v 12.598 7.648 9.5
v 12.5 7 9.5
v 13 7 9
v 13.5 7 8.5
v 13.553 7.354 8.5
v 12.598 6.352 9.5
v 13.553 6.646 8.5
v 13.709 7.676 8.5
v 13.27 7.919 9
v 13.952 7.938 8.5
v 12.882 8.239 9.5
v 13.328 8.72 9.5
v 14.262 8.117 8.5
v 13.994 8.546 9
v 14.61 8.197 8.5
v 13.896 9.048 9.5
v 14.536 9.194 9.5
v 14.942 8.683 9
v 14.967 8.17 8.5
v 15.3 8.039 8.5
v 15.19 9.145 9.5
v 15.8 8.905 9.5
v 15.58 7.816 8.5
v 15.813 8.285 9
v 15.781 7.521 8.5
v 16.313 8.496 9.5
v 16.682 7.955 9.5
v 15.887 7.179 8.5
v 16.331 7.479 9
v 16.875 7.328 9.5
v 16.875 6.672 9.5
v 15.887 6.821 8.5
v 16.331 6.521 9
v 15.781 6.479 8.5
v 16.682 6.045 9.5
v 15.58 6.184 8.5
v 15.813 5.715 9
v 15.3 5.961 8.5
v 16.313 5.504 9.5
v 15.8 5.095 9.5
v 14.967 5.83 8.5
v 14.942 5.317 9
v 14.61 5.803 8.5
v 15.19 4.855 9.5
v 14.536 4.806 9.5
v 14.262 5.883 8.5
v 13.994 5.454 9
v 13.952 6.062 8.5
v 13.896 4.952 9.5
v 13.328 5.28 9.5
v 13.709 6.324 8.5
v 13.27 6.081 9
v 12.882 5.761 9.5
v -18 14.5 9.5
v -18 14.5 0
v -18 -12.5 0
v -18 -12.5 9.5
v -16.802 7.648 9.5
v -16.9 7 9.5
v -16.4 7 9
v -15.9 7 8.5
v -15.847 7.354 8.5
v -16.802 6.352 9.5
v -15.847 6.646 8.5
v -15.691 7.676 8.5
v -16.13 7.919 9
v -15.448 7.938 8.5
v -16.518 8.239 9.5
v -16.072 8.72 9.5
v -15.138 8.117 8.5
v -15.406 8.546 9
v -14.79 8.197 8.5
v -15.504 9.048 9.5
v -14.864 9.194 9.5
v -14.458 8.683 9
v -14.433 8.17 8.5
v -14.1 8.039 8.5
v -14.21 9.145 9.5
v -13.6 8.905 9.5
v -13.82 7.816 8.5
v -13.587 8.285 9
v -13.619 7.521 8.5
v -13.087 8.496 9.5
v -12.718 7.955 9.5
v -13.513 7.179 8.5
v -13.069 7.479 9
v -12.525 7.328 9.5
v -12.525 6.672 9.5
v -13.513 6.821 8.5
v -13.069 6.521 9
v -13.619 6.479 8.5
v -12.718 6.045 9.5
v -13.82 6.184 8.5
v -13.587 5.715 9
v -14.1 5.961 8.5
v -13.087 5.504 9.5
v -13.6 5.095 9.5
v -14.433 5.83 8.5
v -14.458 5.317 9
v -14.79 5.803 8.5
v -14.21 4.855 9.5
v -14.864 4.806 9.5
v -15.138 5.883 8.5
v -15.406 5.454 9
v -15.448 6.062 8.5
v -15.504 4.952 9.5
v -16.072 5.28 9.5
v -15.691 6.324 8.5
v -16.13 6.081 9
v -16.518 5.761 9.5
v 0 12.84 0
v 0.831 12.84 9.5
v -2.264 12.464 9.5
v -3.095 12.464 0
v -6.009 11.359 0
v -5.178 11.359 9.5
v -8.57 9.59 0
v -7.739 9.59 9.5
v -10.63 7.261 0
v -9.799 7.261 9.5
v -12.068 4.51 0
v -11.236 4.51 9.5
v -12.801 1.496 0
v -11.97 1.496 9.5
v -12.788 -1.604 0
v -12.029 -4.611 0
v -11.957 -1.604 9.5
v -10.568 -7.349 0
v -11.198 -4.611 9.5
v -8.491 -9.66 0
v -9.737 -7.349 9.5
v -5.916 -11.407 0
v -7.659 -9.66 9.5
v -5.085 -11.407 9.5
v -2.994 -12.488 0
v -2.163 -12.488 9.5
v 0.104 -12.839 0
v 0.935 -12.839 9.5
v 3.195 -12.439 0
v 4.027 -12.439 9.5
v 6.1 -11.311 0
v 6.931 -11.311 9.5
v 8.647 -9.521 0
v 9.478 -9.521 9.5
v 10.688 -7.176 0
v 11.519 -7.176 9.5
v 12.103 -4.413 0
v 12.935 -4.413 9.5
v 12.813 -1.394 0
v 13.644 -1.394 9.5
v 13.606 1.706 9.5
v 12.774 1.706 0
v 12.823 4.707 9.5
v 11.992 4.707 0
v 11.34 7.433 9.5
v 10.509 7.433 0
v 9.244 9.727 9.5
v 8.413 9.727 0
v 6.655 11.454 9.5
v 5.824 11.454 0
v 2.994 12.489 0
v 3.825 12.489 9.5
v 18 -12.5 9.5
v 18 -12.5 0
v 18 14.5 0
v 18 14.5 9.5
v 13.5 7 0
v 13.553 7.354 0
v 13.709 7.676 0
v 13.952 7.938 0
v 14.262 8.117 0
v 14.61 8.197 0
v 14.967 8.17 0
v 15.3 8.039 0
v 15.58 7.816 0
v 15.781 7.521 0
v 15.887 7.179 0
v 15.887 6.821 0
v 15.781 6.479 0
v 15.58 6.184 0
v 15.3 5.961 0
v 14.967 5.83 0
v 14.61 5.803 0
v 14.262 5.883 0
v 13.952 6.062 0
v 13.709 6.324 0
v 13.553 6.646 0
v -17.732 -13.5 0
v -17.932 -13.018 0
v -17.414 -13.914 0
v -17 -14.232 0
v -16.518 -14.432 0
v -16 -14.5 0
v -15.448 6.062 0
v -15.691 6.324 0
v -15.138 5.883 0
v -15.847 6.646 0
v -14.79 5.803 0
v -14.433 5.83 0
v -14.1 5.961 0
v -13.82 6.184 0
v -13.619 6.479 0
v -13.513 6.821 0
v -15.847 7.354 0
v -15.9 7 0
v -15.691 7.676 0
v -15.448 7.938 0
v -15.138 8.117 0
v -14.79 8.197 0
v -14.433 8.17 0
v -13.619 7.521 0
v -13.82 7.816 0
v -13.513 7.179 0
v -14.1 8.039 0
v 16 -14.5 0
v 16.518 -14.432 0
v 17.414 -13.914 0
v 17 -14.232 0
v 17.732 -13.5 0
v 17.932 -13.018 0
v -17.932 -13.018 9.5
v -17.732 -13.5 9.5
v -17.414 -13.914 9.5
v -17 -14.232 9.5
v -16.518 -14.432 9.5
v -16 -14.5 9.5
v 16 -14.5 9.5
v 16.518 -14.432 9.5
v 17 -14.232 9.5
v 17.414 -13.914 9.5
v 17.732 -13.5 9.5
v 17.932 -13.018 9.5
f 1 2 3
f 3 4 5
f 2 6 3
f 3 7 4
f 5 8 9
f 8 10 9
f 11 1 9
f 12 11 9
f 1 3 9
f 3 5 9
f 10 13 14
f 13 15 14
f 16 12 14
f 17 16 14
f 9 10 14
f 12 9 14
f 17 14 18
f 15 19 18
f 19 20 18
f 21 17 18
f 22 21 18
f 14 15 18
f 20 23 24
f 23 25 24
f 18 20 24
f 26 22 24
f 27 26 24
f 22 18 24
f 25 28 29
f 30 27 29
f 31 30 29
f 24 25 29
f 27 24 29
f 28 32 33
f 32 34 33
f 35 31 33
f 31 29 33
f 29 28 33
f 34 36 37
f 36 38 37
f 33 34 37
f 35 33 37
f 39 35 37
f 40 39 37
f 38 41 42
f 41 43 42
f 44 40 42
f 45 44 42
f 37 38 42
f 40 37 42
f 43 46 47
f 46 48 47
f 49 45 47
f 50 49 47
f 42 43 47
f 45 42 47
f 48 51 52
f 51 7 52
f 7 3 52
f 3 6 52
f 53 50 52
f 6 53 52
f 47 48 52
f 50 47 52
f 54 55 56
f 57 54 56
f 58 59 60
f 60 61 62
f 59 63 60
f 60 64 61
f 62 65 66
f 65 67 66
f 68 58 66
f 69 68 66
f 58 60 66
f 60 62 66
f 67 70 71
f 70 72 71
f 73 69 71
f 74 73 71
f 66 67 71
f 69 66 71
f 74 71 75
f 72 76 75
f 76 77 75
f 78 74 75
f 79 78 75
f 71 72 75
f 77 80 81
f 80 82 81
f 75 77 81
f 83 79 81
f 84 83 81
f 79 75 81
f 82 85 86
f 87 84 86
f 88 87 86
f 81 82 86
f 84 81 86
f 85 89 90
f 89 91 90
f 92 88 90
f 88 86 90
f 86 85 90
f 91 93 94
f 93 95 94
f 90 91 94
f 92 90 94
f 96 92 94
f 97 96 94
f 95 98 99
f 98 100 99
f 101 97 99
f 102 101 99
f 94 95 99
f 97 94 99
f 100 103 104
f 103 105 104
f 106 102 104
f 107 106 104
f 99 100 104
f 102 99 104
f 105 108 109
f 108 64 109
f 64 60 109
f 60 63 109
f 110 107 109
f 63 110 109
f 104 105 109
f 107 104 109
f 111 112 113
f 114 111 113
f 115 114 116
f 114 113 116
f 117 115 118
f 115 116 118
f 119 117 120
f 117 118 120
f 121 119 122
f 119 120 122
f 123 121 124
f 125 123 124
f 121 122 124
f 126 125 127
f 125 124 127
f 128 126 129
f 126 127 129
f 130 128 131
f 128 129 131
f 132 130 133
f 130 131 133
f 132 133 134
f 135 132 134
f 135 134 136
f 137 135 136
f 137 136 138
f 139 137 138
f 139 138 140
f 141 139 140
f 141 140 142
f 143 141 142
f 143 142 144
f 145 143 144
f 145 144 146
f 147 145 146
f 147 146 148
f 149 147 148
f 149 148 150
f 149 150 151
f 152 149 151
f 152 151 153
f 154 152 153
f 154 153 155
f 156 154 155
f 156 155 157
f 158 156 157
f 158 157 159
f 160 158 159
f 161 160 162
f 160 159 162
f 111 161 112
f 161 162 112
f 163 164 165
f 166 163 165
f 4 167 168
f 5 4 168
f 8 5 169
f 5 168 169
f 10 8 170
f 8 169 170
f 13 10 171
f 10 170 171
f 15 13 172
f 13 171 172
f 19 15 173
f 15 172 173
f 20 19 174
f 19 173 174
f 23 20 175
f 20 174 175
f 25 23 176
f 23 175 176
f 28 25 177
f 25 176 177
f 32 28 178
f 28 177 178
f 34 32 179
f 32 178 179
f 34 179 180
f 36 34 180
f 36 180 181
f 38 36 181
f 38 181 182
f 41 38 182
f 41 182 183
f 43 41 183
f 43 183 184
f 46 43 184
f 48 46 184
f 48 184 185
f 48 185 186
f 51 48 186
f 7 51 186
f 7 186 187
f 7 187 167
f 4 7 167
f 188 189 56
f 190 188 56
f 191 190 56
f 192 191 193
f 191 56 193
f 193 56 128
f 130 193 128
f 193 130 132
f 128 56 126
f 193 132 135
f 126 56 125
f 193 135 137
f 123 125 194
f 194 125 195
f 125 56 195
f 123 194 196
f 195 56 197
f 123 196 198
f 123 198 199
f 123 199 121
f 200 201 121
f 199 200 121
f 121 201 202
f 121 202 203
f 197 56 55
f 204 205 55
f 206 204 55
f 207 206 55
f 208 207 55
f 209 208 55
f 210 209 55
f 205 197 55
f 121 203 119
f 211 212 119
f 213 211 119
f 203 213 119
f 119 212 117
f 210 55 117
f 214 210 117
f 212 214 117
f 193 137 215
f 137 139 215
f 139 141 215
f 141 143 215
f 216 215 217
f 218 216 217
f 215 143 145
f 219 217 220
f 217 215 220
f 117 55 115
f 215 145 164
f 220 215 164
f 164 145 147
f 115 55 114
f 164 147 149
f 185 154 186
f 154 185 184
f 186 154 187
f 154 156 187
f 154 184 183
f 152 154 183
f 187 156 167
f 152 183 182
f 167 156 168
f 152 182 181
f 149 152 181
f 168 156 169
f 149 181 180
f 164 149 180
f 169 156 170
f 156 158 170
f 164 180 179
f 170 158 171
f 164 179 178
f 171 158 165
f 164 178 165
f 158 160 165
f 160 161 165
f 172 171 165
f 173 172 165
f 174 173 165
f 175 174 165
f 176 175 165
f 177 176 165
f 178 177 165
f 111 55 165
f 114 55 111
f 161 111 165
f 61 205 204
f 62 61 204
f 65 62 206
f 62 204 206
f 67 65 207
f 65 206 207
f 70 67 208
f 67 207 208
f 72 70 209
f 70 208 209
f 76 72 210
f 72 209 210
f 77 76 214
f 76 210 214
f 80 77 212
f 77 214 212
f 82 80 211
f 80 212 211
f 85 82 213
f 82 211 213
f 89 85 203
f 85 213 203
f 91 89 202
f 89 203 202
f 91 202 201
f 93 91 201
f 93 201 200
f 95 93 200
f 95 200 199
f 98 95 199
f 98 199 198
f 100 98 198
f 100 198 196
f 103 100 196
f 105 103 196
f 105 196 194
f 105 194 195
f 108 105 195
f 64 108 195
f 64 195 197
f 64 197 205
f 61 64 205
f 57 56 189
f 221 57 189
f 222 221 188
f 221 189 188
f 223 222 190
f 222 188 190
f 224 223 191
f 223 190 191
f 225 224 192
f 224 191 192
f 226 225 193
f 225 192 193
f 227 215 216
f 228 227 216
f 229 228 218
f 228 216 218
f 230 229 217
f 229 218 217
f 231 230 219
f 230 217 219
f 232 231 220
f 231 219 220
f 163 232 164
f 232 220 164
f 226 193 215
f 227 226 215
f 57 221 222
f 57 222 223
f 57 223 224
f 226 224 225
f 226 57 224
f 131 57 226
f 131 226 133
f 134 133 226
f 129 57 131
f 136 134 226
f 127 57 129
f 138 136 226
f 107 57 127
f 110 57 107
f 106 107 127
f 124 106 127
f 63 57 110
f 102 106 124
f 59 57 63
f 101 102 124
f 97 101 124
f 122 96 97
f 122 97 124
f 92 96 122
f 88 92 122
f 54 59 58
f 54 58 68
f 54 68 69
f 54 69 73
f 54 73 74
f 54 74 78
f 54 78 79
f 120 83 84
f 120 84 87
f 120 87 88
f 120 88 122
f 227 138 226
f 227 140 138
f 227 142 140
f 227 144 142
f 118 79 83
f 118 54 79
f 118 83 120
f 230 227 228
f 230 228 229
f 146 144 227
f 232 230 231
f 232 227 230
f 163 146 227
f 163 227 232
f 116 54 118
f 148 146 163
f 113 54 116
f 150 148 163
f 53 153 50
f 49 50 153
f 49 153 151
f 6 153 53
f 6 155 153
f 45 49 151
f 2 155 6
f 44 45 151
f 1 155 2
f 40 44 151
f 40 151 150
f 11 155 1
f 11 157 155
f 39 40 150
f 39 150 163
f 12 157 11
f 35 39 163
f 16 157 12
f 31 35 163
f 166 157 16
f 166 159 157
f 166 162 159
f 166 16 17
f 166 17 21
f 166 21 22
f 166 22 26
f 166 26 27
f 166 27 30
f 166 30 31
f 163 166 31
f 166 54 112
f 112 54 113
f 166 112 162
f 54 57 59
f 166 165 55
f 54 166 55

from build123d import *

# Parameters (mm, degrees)
BOSS_EXTRUDE1_DEPTH                                 = 9.5
CUT_EXTRUDE1_REACH                                  = 14.601
SKETCH2_R                                           = 12.8397
CSK_FOR_M2_COUNTERSUNK_FLAT_HEAD_SCREW1_D           = 2.4
CSK_FOR_M2_COUNTERSUNK_FLAT_HEAD_SCREW1_DEPTH       = 9.5
CSK_FOR_M2_COUNTERSUNK_FLAT_HEAD_SCREW1_CSINK_D     = 4.4
CSK_FOR_M2_COUNTERSUNK_FLAT_HEAD_SCREW1_CSINK_ANGLE = 90


with BuildPart() as part:
    # Sketch1 → Boss-Extrude1 (new body)
    with BuildSketch(Plane.XY):
        with BuildLine():
            Line((-16, -14.5), (16, -14.5))
            ThreePointArc((16, -14.5), (17.414213562, -13.914213562), (18, -12.5))
            Line((18, -12.5), (18, 14.5))
            Line((18, 14.5), (-18, 14.5))
            Line((-18, 14.5), (-18, -12.5))
            ThreePointArc((-18, -12.5), (-17.414213562, -13.914213562), (-16, -14.5))
        make_face()
    extrude(amount=BOSS_EXTRUDE1_DEPTH)

    # Sketch2 → Cut-Extrude1 (cut, up to next)
    with BuildSketch(Plane(origin=(0.961559067, 0, 10.990670426), x_dir=(0, 1, 0), z_dir=(0.087155743, 0, 0.996194698)), mode=Mode.PRIVATE) as cut_extrude1_sk1:
        Circle(SKETCH2_R)
    cut_extrude1_tool1 = extrude(cut_extrude1_sk1.sketch, amount=-CUT_EXTRUDE1_REACH, mode=Mode.PRIVATE) & part.part
    add(cut_extrude1_tool1.solids().sort_by_distance((0.961559, 0, 10.99067))[0], mode=Mode.SUBTRACT)

    # CSK for M2 Countersunk Flat Head Screw1
    with Locations(Plane.XY.offset(9.5)):
        with Locations((-14.7, 7), (14.7, 7)):
            CounterSinkHole(CSK_FOR_M2_COUNTERSUNK_FLAT_HEAD_SCREW1_D / 2, CSK_FOR_M2_COUNTERSUNK_FLAT_HEAD_SCREW1_CSINK_D / 2, depth=CSK_FOR_M2_COUNTERSUNK_FLAT_HEAD_SCREW1_DEPTH, counter_sink_angle=CSK_FOR_M2_COUNTERSUNK_FLAT_HEAD_SCREW1_CSINK_ANGLE)


solid = part.part
